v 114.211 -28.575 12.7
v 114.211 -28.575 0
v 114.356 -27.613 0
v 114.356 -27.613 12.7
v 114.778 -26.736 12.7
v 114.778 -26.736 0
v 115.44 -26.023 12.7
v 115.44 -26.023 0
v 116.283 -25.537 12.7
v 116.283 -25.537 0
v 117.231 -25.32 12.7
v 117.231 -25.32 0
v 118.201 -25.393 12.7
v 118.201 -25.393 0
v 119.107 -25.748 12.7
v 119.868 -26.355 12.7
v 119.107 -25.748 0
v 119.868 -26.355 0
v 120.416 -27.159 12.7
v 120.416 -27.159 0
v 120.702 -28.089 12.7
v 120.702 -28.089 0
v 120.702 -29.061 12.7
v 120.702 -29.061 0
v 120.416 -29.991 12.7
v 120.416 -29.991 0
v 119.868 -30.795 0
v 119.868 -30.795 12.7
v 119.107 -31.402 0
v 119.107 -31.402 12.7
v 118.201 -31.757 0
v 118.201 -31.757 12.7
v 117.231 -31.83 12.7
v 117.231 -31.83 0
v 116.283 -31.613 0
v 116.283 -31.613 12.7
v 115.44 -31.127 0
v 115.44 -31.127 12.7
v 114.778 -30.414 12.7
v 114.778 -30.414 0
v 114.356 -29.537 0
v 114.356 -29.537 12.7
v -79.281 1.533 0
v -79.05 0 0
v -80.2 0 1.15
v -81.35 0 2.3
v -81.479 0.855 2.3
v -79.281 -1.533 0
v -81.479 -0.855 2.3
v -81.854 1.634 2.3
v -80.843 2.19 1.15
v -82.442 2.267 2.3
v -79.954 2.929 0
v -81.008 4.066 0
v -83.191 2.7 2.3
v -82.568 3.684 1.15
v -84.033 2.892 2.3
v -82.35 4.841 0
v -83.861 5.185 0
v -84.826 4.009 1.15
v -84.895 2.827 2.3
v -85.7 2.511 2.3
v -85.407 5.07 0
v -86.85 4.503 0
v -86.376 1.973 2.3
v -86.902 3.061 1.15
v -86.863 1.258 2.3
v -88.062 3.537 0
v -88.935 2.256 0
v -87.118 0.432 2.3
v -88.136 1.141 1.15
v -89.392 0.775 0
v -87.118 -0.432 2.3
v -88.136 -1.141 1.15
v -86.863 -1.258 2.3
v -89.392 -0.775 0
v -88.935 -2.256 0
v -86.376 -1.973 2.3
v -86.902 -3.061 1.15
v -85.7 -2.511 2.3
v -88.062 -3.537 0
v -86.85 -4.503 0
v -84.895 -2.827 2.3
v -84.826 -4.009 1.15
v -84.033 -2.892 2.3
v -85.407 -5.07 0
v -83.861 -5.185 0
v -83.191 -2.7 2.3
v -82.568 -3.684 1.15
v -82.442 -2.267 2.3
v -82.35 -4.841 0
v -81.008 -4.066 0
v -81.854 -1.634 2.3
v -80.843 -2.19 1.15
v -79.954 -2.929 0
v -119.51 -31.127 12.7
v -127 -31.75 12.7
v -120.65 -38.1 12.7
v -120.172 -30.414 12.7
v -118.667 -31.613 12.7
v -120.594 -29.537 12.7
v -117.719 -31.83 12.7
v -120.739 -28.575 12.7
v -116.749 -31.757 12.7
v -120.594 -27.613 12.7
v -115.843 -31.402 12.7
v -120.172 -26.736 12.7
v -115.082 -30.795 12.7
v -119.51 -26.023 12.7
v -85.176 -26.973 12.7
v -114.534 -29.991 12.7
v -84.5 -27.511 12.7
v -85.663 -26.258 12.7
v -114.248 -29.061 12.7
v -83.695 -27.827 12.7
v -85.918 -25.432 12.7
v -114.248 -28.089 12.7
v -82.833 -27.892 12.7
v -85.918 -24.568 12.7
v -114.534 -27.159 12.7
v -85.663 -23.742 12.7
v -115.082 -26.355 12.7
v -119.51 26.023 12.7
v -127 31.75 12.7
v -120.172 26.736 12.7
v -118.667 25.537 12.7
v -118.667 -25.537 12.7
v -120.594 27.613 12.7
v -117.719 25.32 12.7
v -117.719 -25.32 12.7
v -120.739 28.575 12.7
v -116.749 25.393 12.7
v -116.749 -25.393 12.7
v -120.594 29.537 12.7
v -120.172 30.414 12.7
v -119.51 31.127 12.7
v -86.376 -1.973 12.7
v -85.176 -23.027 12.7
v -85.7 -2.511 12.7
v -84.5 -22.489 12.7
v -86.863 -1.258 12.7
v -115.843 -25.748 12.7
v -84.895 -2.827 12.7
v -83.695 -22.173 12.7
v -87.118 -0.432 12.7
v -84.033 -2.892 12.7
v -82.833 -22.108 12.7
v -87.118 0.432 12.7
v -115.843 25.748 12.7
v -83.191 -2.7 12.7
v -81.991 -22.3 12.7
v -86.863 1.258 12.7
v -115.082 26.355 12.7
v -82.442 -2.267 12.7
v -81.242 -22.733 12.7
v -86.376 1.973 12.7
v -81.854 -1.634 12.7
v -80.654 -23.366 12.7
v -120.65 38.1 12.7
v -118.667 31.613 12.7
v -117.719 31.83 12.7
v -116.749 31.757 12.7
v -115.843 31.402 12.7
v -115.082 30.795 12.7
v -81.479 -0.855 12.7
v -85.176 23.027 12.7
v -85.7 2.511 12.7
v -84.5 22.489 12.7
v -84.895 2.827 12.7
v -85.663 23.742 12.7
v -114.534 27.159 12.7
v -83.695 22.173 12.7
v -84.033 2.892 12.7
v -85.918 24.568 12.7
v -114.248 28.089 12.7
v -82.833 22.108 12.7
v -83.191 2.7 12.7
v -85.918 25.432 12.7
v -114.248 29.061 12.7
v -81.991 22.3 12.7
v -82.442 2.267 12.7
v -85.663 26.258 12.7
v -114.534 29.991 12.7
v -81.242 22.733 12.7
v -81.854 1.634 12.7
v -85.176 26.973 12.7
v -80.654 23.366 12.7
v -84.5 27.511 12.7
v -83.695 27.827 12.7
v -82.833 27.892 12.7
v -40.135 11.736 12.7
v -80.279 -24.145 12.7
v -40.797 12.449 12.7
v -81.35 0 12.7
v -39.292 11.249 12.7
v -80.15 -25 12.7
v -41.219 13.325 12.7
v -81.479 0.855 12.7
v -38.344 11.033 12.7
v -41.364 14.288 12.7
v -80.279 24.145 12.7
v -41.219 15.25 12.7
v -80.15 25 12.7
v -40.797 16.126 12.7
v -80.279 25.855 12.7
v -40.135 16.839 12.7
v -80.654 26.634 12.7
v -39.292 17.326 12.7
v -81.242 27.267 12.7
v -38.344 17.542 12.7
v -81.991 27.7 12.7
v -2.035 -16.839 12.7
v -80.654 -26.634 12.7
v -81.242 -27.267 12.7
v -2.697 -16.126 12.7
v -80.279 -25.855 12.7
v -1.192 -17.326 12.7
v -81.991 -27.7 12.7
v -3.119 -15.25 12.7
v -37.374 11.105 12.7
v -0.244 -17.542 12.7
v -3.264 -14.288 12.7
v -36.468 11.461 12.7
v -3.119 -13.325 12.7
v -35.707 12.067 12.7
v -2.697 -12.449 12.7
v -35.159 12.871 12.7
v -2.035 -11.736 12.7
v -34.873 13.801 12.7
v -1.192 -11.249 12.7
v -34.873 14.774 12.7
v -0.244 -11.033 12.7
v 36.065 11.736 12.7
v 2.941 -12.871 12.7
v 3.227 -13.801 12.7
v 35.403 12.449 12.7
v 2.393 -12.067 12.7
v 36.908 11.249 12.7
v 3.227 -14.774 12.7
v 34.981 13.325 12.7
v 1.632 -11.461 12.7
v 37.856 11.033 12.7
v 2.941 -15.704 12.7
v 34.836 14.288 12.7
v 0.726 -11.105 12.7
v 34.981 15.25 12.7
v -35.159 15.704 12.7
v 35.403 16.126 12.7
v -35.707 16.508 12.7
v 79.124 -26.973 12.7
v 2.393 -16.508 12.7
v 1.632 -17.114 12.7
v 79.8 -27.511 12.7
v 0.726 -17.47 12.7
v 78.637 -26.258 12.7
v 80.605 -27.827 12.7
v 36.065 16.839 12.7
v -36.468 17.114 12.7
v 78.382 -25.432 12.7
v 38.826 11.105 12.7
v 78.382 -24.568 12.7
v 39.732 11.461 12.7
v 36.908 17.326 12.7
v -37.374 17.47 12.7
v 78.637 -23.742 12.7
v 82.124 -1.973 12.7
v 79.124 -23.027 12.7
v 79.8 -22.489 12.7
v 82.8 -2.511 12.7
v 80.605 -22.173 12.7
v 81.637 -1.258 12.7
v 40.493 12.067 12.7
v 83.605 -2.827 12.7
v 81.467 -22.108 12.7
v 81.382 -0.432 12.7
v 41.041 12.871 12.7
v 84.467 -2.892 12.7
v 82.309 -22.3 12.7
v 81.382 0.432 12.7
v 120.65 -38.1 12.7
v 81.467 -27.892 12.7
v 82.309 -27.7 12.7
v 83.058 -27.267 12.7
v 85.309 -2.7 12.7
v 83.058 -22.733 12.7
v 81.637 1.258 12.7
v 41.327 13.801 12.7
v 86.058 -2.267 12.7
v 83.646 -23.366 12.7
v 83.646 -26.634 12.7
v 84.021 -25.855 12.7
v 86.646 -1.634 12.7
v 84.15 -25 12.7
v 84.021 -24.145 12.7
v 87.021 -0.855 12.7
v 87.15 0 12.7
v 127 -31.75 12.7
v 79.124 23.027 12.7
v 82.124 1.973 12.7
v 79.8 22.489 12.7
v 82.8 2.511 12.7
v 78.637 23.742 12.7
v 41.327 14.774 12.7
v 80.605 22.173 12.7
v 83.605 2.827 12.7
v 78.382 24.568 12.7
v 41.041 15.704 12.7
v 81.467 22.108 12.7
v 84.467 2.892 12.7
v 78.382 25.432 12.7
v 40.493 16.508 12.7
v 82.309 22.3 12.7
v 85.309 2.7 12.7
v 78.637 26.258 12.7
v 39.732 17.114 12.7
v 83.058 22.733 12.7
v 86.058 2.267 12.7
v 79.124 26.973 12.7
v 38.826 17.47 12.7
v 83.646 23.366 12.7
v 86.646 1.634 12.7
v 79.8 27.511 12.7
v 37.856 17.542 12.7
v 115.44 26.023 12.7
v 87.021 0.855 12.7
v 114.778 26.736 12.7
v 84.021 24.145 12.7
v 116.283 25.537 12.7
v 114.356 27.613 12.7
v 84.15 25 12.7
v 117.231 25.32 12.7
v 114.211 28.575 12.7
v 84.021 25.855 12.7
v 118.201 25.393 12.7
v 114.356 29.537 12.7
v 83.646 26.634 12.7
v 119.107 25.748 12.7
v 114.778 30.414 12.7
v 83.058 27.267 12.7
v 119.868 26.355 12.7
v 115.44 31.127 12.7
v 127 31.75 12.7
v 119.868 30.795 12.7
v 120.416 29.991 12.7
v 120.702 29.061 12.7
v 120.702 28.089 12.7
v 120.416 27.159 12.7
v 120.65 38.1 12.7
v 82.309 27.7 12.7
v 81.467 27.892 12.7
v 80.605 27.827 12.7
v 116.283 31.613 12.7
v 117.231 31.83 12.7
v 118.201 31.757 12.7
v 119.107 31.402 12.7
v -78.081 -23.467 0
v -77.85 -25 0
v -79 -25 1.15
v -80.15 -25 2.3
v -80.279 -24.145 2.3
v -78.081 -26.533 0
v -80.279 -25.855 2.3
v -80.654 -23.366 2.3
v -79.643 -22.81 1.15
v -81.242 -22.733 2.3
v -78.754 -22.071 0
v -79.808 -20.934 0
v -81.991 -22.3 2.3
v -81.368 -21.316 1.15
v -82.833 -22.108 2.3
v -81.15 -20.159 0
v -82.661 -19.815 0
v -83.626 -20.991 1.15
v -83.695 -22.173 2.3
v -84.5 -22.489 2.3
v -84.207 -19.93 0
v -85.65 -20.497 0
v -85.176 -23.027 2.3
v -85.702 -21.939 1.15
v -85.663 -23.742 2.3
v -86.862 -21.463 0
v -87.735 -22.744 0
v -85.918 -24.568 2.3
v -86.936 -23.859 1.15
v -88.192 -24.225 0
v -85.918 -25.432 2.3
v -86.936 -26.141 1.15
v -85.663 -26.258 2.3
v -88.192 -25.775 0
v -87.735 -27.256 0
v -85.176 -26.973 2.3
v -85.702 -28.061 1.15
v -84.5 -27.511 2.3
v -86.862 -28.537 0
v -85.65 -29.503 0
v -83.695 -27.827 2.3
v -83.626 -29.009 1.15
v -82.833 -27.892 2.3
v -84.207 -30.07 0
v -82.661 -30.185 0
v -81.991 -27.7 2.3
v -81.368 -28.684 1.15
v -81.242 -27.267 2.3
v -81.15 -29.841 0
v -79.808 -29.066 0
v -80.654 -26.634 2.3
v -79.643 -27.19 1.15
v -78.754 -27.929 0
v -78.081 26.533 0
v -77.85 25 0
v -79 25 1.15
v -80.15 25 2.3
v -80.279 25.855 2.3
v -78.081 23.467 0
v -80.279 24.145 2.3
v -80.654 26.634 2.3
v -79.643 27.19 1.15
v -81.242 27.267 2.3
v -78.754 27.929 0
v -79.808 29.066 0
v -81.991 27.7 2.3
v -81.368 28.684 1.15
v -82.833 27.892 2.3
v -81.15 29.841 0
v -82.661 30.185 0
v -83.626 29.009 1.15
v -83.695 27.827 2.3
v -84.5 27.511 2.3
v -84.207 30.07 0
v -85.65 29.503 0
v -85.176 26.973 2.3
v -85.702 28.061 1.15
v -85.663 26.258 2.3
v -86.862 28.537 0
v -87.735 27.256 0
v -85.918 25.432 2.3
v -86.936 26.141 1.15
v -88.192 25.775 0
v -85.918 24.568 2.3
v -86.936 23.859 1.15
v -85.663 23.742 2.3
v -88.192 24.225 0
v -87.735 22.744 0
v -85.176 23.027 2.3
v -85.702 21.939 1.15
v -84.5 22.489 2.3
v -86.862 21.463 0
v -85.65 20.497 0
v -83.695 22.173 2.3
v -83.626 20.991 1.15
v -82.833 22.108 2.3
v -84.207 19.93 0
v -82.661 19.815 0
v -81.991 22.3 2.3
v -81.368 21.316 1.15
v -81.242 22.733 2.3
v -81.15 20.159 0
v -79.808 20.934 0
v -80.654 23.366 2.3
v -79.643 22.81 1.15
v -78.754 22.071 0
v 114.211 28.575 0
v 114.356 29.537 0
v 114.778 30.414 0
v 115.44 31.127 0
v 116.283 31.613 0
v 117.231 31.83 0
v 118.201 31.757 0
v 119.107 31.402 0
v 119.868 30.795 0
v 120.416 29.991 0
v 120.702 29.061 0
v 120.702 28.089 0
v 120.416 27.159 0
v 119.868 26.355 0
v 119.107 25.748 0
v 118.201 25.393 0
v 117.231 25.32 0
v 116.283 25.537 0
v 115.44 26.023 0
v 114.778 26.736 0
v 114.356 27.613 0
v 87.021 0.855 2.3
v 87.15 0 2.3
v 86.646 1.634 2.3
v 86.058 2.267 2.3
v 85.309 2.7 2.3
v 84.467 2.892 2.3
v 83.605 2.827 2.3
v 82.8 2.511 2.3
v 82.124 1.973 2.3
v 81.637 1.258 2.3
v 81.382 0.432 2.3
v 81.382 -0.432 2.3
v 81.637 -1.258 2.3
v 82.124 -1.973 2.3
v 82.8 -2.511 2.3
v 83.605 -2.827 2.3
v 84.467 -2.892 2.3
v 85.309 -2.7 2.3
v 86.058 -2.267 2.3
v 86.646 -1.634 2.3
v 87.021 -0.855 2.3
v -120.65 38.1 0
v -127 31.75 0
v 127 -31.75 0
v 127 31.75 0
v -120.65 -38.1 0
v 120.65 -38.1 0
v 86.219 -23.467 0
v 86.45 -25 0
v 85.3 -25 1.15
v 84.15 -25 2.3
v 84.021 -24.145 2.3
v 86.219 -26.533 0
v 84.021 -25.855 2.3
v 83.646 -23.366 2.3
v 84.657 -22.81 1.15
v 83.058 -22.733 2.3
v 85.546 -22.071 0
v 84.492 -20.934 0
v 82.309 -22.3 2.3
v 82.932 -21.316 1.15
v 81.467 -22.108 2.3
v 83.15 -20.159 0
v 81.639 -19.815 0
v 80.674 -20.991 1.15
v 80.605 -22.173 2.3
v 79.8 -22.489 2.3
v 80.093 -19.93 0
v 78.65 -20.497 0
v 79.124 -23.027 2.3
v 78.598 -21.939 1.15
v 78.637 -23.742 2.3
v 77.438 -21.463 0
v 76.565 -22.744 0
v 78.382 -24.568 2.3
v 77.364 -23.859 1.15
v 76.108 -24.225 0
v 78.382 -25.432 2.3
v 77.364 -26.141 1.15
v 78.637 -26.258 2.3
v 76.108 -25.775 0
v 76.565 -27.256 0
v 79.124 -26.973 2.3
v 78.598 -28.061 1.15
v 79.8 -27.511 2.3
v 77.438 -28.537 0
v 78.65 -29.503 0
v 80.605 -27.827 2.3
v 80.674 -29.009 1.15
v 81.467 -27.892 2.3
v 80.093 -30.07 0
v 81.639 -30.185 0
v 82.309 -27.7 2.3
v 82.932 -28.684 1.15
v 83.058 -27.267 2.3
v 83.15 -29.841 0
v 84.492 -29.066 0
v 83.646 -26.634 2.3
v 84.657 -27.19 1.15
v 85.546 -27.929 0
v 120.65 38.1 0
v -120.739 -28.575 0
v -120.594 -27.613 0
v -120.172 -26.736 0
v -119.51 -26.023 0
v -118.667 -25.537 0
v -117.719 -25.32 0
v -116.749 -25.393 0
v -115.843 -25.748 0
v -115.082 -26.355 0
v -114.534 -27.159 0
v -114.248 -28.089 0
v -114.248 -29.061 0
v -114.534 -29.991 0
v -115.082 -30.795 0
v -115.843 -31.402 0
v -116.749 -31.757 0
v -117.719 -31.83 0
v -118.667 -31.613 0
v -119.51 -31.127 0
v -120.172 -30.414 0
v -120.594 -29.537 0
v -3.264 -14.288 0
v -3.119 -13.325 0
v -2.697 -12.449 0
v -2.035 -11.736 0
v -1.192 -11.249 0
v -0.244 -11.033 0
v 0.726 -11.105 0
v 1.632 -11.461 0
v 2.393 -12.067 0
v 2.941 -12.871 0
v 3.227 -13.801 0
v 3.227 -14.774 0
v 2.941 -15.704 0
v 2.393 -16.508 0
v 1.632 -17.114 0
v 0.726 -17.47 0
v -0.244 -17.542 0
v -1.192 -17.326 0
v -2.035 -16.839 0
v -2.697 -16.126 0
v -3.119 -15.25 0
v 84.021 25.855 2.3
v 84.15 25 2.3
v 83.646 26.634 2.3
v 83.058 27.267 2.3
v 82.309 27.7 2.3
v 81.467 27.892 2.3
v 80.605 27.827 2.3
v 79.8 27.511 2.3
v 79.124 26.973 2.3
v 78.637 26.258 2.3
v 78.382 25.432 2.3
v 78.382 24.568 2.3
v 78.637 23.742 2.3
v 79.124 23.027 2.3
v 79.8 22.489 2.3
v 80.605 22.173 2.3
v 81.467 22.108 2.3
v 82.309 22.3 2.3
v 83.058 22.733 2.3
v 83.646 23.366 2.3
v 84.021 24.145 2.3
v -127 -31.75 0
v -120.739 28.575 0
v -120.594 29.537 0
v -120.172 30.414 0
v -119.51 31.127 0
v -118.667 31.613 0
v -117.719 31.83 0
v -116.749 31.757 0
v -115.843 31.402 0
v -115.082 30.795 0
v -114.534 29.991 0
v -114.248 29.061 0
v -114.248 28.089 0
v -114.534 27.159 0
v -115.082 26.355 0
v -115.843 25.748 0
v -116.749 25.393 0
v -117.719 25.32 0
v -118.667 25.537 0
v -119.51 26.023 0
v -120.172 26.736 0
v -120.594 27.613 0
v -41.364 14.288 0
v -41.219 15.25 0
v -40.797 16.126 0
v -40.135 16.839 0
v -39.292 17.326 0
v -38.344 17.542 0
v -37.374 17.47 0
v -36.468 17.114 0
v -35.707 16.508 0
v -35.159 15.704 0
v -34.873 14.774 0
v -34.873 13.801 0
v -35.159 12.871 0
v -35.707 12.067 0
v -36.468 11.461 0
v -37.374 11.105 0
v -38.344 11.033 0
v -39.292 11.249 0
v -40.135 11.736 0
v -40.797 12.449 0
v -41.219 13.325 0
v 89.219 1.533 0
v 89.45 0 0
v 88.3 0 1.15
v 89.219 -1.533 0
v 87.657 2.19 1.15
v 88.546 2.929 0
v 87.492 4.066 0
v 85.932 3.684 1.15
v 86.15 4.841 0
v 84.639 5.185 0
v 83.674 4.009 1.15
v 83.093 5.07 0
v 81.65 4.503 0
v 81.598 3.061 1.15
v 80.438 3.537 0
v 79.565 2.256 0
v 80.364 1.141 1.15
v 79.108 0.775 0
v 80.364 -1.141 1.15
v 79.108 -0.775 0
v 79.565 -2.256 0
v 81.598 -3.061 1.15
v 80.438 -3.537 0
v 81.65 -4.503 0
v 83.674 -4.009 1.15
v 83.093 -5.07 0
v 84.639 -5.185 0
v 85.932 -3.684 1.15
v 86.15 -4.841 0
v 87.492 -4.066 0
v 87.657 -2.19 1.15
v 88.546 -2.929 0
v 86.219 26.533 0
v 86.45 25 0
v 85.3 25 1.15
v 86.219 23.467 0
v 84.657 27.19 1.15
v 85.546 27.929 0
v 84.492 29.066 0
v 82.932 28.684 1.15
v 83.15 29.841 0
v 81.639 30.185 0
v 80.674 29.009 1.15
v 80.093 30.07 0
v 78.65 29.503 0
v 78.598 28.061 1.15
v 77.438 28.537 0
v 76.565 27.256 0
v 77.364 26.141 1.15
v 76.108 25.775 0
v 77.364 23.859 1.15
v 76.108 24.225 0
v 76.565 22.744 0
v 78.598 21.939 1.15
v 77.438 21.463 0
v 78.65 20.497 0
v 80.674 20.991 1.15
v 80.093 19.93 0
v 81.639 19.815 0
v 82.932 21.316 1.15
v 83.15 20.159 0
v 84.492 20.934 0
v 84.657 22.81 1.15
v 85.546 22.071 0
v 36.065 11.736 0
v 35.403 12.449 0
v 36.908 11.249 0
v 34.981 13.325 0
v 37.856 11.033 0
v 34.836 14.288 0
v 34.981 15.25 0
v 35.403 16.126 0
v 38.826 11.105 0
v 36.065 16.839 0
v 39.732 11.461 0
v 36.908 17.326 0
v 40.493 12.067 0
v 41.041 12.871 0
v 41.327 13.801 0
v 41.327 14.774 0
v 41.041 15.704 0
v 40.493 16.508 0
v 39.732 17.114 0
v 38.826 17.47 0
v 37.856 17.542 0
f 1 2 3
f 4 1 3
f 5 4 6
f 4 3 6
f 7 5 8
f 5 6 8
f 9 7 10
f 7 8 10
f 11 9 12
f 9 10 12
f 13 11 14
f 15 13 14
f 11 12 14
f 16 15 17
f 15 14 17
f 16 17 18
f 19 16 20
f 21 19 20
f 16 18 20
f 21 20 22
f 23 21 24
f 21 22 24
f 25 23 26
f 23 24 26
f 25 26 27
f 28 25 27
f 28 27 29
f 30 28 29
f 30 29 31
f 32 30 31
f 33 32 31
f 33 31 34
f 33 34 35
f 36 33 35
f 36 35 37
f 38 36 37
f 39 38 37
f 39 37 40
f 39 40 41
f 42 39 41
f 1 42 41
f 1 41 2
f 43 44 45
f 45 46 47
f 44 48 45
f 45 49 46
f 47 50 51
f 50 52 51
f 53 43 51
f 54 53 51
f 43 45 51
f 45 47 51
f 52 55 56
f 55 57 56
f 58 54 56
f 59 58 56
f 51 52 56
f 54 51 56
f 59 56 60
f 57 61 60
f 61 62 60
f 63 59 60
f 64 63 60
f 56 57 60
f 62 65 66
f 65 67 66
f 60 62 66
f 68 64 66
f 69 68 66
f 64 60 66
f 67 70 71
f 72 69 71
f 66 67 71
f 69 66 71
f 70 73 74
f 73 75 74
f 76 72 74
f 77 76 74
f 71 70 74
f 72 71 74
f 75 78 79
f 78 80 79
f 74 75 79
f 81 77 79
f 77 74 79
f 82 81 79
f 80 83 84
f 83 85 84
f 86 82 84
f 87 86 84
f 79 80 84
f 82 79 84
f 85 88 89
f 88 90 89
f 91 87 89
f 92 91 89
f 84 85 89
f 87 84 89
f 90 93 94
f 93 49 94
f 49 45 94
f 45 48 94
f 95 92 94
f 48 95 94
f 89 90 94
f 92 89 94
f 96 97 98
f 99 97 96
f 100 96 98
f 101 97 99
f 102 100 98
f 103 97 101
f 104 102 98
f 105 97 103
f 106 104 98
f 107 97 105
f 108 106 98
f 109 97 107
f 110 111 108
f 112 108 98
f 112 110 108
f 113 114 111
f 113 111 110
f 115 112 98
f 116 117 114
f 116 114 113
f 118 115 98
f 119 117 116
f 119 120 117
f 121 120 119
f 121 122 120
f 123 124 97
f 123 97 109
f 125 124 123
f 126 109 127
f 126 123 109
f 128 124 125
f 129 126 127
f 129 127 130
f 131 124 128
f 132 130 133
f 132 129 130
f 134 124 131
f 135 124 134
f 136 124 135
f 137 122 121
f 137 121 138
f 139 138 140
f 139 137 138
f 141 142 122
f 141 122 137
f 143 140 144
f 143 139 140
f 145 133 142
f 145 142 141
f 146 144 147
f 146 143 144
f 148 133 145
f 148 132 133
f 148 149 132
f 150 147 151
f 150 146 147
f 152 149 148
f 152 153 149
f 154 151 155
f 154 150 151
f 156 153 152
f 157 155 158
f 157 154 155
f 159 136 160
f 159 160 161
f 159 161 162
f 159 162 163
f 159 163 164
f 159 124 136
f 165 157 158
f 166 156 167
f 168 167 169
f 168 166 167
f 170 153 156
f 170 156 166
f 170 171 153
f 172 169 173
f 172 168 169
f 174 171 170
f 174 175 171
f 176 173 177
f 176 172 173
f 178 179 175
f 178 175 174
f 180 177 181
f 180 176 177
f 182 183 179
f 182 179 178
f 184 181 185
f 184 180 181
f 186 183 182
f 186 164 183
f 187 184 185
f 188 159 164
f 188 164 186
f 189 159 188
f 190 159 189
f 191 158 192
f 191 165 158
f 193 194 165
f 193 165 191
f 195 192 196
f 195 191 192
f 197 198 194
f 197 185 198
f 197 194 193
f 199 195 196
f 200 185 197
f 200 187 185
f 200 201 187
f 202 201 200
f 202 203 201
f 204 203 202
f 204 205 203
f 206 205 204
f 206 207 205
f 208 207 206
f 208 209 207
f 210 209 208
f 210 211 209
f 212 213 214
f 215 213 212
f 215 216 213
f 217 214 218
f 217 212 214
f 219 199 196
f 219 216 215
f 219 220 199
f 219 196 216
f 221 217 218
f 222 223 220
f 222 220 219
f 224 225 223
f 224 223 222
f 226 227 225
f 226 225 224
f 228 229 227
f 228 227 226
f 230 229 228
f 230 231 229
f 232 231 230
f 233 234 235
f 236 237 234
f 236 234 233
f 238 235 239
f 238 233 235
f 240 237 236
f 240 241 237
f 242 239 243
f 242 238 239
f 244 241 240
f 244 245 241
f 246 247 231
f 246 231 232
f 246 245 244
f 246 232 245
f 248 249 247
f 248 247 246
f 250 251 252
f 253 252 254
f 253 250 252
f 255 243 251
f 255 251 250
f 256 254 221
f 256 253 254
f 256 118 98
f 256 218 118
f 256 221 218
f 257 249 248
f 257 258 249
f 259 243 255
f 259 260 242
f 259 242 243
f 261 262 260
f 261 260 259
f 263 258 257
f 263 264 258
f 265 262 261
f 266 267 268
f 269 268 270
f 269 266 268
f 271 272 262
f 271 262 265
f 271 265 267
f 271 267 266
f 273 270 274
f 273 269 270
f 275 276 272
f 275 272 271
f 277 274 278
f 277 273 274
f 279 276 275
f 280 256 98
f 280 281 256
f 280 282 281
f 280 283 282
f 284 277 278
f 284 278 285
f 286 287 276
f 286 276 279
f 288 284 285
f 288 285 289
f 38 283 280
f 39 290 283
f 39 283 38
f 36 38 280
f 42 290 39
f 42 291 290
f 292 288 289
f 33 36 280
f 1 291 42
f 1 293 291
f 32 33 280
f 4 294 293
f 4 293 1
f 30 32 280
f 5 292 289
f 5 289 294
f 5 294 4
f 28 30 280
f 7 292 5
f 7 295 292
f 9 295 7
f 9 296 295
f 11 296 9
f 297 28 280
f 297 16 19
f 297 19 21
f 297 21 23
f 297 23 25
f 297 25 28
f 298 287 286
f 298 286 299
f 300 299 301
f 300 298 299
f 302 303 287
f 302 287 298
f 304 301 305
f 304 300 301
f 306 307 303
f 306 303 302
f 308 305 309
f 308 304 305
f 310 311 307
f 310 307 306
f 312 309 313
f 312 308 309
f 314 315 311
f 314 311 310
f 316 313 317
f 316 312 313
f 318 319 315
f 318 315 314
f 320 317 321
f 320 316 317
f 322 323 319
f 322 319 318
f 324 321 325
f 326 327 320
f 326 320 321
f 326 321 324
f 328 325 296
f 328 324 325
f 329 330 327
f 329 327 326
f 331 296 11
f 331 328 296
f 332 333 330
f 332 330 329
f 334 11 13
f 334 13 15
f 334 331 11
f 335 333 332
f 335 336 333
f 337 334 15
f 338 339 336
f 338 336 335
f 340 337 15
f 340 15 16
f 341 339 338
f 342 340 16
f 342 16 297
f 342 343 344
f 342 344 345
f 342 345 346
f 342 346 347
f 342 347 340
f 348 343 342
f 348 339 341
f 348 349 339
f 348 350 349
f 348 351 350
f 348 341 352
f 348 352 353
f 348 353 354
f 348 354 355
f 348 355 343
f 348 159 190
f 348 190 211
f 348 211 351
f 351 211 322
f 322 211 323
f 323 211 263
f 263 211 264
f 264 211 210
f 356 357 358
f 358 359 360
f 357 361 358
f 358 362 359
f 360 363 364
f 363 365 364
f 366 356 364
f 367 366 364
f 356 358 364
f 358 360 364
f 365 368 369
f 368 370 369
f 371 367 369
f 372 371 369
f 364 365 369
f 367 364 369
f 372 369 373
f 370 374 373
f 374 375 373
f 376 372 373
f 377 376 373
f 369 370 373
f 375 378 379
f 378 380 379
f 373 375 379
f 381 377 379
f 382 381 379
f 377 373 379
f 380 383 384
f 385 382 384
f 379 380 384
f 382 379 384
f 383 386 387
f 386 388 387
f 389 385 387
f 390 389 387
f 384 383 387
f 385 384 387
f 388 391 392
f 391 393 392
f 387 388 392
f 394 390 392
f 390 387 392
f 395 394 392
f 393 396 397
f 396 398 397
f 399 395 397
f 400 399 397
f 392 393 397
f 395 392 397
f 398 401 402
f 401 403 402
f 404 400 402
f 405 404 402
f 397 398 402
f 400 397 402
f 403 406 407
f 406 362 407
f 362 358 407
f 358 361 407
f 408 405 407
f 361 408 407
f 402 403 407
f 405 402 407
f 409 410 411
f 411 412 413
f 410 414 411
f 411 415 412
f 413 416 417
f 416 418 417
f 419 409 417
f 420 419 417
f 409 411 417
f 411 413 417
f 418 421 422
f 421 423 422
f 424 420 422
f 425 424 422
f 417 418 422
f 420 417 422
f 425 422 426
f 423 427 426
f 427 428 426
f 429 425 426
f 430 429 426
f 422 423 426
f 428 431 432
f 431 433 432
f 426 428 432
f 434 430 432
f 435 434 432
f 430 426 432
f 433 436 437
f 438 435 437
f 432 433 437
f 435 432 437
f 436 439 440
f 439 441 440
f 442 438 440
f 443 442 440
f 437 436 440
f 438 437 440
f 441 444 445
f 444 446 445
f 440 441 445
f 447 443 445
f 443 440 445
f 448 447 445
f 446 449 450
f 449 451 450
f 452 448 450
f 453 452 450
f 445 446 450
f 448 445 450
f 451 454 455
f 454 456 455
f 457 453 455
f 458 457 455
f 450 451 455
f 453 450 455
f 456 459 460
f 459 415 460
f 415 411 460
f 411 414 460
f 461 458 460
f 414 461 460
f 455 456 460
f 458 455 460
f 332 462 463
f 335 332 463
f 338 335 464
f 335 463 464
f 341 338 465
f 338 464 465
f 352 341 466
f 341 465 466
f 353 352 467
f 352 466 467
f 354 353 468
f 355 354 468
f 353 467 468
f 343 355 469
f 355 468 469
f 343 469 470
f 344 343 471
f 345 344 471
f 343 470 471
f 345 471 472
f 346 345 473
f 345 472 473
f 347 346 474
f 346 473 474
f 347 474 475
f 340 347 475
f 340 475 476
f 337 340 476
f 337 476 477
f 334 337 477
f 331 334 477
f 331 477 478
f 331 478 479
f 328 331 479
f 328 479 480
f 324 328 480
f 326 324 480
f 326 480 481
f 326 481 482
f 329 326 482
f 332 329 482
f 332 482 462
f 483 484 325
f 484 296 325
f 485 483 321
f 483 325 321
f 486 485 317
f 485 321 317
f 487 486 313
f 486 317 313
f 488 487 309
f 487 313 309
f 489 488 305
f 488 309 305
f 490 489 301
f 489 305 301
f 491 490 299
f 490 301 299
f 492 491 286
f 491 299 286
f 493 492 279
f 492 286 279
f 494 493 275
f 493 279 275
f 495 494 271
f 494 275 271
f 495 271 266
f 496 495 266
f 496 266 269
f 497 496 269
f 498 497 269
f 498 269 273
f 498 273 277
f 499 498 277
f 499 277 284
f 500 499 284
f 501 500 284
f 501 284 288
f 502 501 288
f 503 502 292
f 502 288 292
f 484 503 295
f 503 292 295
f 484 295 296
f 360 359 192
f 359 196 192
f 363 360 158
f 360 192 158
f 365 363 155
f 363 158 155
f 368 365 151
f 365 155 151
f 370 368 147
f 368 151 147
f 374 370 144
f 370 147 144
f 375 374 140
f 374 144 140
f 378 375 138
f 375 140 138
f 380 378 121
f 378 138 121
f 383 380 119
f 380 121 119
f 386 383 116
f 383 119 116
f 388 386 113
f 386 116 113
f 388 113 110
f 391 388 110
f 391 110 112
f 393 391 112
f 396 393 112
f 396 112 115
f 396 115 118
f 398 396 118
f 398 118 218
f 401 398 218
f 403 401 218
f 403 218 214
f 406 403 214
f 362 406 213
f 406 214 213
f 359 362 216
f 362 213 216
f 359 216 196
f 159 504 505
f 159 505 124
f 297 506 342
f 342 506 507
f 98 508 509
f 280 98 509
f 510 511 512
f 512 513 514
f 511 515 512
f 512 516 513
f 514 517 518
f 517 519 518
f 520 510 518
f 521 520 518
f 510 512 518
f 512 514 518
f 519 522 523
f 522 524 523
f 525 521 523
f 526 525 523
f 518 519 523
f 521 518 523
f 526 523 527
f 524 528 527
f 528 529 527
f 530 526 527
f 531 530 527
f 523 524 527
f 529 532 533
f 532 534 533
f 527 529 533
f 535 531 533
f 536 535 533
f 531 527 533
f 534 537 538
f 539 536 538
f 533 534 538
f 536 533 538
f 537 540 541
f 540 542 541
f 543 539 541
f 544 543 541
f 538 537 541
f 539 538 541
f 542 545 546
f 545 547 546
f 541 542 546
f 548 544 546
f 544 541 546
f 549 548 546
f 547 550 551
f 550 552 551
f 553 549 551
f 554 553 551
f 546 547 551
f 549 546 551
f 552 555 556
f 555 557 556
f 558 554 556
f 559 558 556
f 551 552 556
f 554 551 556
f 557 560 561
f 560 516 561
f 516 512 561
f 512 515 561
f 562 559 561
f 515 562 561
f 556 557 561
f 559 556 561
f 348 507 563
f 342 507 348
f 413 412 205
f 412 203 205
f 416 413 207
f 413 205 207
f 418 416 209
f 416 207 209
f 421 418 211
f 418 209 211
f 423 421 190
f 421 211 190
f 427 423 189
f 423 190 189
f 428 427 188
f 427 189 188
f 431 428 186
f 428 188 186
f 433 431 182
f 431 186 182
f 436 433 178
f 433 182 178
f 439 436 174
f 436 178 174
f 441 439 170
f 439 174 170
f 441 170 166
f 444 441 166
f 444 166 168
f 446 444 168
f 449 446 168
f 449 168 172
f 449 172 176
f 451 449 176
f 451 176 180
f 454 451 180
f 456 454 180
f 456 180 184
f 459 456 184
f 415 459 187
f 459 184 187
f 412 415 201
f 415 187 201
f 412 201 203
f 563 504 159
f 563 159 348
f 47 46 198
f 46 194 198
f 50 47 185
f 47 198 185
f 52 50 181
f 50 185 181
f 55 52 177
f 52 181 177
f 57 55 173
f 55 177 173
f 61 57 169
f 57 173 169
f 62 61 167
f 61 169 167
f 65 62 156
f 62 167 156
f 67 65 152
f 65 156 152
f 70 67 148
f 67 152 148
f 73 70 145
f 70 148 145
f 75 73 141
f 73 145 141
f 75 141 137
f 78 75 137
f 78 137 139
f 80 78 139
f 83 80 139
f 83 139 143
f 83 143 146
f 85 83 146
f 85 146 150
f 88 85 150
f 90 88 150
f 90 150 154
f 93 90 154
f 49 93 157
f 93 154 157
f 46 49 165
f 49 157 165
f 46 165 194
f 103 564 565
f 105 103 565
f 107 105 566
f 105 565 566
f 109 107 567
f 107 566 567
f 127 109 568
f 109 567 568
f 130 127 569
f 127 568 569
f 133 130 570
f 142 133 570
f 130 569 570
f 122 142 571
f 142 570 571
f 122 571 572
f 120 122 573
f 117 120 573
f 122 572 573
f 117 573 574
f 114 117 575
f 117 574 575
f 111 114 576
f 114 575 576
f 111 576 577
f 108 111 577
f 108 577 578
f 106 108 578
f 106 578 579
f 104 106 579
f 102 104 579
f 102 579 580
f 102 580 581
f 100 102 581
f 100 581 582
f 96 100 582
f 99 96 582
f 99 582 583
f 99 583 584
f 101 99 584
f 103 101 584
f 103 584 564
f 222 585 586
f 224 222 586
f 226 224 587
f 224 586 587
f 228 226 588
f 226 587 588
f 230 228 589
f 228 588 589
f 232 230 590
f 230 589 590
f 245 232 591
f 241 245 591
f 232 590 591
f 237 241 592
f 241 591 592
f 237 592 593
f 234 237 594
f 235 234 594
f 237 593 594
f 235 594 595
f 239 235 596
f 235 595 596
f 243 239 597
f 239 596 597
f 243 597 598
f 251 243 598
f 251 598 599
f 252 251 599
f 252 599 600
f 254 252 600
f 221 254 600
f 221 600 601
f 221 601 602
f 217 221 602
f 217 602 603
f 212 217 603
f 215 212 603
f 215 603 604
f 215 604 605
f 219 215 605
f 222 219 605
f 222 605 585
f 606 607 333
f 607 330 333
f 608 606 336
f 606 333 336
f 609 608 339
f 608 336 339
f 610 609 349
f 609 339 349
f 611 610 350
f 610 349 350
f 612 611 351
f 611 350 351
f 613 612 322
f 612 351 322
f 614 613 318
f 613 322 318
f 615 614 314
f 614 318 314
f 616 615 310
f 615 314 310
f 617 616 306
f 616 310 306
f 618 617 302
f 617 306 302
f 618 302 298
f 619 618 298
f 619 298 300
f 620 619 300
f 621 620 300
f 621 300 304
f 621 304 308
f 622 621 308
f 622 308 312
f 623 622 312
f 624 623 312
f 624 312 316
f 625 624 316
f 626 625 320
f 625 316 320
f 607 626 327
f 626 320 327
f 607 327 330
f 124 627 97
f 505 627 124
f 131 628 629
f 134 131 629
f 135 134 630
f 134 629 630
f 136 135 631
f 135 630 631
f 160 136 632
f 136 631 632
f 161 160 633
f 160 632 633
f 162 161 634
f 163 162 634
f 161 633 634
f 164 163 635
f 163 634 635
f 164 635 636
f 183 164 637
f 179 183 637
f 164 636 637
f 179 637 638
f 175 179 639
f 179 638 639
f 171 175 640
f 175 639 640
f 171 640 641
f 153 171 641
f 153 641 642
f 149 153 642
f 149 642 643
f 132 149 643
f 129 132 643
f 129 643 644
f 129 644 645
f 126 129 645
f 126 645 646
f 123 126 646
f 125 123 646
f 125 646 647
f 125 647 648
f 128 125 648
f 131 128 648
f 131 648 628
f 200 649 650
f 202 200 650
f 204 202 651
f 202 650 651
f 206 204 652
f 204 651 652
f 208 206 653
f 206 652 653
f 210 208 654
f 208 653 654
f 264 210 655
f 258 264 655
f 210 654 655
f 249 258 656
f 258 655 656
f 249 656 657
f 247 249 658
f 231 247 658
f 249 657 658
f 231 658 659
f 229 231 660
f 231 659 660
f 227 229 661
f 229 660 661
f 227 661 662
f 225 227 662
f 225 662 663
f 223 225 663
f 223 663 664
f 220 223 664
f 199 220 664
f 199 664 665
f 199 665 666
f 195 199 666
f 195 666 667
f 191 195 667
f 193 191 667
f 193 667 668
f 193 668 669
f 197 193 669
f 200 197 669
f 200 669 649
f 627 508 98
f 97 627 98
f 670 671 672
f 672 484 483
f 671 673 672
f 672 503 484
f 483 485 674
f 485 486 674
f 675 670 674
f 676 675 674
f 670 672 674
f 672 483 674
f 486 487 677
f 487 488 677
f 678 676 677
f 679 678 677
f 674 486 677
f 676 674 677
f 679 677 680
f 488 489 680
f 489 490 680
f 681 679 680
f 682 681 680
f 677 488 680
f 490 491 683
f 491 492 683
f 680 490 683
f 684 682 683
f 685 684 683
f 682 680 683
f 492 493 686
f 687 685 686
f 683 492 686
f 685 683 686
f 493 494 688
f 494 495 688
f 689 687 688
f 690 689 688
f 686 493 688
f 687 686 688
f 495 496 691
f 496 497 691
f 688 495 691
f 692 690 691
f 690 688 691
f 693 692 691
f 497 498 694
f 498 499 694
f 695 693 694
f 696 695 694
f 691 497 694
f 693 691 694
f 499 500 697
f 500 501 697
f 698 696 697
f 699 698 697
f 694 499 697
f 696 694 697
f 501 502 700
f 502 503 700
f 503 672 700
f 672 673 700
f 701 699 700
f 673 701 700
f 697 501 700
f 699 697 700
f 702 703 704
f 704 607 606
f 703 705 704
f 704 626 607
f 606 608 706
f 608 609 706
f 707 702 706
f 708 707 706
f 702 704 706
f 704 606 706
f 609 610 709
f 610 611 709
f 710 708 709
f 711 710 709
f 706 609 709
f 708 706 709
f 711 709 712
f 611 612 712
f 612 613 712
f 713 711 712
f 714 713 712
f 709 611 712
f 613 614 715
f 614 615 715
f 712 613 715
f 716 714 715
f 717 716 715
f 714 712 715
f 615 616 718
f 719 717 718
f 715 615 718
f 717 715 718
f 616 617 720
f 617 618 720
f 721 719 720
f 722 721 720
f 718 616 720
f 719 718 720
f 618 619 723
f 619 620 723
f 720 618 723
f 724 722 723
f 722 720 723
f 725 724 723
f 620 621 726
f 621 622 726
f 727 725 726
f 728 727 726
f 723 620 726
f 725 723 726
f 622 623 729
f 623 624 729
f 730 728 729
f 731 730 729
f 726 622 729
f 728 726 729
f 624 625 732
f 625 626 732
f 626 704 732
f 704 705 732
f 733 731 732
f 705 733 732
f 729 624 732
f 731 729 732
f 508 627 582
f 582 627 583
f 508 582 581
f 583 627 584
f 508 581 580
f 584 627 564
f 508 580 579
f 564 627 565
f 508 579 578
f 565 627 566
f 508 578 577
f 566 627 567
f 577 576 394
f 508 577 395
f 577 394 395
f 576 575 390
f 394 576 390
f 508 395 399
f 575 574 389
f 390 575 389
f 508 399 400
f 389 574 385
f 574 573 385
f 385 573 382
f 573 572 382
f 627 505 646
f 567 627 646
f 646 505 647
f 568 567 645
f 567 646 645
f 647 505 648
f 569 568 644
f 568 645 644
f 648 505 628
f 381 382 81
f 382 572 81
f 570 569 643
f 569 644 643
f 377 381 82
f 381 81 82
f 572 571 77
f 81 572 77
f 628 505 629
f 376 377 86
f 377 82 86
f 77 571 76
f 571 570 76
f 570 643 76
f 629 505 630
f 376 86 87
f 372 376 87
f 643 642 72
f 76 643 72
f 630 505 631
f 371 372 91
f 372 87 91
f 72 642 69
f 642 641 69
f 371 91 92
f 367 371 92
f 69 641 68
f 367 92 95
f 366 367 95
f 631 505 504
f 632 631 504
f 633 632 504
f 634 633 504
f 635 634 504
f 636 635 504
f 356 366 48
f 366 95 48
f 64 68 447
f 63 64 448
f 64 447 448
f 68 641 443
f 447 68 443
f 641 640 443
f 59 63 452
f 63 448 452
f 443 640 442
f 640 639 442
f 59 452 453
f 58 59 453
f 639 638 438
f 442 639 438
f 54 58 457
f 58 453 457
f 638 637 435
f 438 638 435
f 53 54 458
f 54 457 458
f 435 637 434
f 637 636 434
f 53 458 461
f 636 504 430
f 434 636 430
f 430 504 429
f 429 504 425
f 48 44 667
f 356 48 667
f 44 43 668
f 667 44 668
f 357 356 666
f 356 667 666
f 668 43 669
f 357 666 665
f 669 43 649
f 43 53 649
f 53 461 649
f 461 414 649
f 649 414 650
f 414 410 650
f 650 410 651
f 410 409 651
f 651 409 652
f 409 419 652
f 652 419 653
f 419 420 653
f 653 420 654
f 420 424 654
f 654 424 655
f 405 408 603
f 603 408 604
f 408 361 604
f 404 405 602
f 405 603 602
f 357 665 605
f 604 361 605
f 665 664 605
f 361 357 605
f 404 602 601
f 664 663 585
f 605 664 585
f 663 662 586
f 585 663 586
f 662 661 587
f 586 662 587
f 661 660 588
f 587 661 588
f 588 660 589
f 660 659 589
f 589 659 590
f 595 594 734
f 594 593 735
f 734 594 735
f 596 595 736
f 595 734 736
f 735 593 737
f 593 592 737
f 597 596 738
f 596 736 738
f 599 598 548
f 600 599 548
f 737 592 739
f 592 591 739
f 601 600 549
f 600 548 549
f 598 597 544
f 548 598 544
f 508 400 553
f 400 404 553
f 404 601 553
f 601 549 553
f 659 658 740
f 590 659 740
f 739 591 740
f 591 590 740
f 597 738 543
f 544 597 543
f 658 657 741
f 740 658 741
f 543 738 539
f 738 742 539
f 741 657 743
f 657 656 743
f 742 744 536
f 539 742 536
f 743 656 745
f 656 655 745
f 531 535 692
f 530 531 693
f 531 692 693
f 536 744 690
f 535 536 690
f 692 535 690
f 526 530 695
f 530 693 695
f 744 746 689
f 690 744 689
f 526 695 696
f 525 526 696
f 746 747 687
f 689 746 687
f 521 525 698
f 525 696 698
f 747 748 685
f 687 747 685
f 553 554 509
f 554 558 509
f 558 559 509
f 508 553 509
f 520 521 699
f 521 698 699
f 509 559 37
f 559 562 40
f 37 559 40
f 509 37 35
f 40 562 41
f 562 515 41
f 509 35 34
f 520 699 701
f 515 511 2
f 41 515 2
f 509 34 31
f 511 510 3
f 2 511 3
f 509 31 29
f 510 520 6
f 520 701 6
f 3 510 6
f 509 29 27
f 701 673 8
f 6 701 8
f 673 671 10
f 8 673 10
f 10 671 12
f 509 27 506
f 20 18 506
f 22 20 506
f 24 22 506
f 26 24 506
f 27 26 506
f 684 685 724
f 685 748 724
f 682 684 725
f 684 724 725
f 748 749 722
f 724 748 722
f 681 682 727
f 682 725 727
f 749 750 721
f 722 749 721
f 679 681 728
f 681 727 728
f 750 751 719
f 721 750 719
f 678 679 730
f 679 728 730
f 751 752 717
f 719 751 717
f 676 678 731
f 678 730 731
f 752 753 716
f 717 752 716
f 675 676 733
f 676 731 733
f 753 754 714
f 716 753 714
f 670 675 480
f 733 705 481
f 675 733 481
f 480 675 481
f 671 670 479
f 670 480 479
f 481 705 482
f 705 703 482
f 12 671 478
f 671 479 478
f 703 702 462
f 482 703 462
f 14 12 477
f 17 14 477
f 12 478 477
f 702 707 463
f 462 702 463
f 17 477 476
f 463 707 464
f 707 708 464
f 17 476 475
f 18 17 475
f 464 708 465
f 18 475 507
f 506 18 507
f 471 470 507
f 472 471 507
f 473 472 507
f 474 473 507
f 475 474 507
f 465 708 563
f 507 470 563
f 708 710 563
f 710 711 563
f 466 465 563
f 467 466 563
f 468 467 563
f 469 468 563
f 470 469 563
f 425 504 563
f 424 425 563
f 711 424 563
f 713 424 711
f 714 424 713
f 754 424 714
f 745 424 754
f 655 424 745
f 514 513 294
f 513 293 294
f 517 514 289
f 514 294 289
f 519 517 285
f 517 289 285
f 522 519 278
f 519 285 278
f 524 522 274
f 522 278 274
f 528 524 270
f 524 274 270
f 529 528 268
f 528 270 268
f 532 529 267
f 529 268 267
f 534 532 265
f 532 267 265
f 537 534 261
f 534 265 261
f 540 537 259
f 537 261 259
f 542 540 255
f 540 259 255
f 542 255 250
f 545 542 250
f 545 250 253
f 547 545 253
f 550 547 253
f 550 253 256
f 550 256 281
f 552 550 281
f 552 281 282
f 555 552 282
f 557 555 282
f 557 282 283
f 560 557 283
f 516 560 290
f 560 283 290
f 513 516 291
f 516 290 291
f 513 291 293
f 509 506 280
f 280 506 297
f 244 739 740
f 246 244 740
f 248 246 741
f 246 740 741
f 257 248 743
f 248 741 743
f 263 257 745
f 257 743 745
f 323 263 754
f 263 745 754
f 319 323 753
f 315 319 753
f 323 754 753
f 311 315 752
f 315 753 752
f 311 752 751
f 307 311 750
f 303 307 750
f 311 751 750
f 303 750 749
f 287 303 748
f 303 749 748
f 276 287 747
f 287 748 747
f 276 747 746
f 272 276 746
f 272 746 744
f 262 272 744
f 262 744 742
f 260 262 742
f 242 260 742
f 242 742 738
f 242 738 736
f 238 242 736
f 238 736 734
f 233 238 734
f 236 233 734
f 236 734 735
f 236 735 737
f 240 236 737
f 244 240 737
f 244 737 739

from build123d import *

# Parameters (mm, degrees)
SKETCH1_W                                       = 254
SKETCH1_H                                       = 76.2
BOSS_EXTRUDE1_DEPTH                             = 12.7
F_1_4_CLEARANCE_HOLE1_D                         = 6.5278
CHAMFER1_SIZE                                   = 6.35
CSK_FOR_M5_FLAT_HEAD_MACHINE_SCREW1_D           = 5.8
CSK_FOR_M5_FLAT_HEAD_MACHINE_SCREW1_CSINK_D     = 10.4
CSK_FOR_M5_FLAT_HEAD_MACHINE_SCREW1_CSINK_ANGLE = 90


with BuildPart() as part:
    # Sketch1 → Boss-Extrude1 (new body)
    with BuildSketch(Plane.XY):
        Rectangle(SKETCH1_W, SKETCH1_H)
    extrude(amount=BOSS_EXTRUDE1_DEPTH)

    # 1/4 Clearance Hole1 (through all)
    with Locations(Plane.XY.offset(12.7)):
        with Locations((38.1, 14.2875), (-117.475, -28.575), (-117.475, 28.575), (117.475, -28.575), (117.475, 28.575), (-38.1, 14.2875), (0, -14.2875)):
            Hole(F_1_4_CLEARANCE_HOLE1_D / 2)

    # Chamfer1
    chamfer1_edges = [part.edges().sort_by_distance(p)[0] for p in [
        (-127, 38.1, 6.35),
        (127, 38.1, 6.35),
        (127, -38.1, 6.35),
        (-127, -38.1, 6.35),
    ]]
    chamfer(chamfer1_edges, length=CHAMFER1_SIZE)

    # CSK for M5 Flat Head Machine Screw1 (through all)
    with Locations(Plane(origin=(0, 0, 0), x_dir=(-1, 0, 0), z_dir=(0, 0, -1))):
        with Locations((-81.25, -25), (-81.25, 25), (83.05, 25), (83.05, -25), (-84.25, 0), (84.25, 0)):
            CounterSinkHole(CSK_FOR_M5_FLAT_HEAD_MACHINE_SCREW1_D / 2, CSK_FOR_M5_FLAT_HEAD_MACHINE_SCREW1_CSINK_D / 2, counter_sink_angle=CSK_FOR_M5_FLAT_HEAD_MACHINE_SCREW1_CSINK_ANGLE)


solid = part.part
